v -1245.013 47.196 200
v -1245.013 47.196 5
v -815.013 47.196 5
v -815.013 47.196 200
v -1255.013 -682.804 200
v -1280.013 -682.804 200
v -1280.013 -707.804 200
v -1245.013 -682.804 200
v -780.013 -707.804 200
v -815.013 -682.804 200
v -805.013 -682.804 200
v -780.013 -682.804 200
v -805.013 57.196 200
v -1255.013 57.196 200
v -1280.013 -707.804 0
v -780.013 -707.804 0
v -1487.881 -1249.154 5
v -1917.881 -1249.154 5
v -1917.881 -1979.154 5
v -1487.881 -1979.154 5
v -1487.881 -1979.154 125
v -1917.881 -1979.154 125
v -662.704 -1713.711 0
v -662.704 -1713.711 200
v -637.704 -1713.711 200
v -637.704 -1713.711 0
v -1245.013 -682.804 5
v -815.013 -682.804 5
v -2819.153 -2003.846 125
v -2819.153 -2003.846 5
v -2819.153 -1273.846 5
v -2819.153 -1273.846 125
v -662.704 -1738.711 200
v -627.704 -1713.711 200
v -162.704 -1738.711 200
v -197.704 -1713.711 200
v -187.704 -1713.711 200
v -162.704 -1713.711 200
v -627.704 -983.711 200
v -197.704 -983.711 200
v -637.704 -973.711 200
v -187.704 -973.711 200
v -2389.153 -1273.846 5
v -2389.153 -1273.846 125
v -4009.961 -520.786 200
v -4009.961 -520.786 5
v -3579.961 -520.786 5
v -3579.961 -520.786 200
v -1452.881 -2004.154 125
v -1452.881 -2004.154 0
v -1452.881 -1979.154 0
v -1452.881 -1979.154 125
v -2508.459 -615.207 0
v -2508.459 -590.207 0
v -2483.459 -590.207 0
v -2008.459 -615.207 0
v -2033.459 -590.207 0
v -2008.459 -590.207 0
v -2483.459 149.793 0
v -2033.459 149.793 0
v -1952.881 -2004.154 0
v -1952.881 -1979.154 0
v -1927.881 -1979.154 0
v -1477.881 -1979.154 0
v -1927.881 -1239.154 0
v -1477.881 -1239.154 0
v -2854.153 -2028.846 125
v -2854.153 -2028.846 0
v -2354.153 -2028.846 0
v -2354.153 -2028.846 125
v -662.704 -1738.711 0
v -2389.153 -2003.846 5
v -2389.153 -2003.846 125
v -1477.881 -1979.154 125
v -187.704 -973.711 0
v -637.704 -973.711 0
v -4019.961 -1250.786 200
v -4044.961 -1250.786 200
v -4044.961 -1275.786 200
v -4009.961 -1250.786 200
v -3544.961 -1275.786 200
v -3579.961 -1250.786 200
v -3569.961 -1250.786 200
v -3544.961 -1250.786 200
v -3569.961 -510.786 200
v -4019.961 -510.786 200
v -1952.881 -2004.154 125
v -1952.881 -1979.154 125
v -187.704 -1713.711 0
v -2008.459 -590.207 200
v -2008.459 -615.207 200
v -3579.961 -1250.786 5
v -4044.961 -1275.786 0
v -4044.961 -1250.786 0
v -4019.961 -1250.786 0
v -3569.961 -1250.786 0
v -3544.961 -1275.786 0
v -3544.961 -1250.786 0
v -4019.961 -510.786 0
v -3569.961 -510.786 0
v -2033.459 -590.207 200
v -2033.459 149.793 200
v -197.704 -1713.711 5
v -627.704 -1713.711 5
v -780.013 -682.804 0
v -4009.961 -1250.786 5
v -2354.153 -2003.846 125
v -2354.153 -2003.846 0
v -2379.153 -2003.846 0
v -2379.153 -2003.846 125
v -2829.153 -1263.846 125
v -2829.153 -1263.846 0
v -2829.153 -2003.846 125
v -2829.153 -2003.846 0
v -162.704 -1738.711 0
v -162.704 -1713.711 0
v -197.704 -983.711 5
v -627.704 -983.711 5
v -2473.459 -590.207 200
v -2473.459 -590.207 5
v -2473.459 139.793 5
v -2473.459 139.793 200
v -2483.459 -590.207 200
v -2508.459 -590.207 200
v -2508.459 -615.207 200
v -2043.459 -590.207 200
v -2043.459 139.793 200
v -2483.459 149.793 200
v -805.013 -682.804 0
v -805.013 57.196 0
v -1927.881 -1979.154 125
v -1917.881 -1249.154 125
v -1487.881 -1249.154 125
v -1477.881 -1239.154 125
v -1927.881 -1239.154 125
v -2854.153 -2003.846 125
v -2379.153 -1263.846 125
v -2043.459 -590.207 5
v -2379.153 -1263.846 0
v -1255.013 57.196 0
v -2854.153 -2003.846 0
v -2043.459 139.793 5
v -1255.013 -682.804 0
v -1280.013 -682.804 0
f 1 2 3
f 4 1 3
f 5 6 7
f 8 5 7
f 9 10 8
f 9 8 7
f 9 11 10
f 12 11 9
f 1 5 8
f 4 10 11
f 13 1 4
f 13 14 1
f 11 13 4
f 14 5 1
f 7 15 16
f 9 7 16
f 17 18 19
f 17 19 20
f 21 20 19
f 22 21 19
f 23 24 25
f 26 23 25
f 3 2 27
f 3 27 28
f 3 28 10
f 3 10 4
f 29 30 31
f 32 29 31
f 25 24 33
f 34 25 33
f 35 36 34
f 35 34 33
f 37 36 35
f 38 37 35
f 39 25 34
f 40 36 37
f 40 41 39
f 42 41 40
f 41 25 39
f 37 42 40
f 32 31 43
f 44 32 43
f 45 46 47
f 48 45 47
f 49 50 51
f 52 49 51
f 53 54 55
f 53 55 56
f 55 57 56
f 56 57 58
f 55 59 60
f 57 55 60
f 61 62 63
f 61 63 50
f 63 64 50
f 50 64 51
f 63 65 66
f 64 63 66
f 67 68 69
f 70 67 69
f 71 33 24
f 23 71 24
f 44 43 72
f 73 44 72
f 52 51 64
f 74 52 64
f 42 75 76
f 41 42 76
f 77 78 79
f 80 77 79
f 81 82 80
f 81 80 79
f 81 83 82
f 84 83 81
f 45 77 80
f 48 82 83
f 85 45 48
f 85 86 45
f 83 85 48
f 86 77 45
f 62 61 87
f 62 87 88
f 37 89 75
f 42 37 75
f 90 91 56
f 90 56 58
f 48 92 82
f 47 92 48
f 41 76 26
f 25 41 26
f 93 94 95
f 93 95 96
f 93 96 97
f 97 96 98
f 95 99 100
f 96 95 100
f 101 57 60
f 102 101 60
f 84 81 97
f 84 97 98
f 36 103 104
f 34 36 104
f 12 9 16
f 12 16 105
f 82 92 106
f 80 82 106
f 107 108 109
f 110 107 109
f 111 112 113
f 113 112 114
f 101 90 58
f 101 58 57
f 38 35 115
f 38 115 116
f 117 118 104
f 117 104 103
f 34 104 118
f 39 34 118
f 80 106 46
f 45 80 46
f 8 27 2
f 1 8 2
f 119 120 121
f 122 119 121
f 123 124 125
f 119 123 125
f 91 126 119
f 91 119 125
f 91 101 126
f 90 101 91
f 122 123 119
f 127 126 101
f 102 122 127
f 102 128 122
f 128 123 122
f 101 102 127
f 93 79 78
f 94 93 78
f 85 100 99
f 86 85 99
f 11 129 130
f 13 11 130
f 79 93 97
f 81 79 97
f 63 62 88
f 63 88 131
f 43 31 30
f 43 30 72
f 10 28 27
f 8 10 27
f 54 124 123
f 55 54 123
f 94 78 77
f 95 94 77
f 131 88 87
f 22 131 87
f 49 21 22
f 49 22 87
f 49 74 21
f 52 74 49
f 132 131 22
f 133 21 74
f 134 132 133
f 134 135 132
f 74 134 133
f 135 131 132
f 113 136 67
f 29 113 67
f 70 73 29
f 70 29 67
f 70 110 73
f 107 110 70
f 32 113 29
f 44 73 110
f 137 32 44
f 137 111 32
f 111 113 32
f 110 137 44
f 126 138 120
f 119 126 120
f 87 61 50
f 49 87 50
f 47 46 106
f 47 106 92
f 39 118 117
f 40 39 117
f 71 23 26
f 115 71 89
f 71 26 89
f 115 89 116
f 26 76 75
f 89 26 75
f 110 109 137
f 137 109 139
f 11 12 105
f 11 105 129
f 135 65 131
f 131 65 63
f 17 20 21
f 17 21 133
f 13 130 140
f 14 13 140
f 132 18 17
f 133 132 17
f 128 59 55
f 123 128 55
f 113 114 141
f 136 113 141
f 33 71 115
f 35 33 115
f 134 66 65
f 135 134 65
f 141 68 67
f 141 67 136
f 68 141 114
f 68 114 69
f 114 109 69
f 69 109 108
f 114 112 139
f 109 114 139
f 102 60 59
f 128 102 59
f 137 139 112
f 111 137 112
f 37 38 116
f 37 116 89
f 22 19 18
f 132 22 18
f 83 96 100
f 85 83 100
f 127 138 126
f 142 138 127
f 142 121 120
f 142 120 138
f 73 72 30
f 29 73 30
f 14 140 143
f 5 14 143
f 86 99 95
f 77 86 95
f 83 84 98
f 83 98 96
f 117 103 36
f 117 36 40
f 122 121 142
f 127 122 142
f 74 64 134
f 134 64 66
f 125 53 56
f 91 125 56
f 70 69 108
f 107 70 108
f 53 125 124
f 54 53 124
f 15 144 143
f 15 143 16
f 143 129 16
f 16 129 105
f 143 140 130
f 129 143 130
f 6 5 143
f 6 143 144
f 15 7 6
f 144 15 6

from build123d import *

# Parameters (mm, degrees)
F0_W     = 430
F0_H     = 10
F0_W_2   = 10
F0_H_2   = 730
F0_W_3   = 25
F0_H_3   = 25
F1_DEPTH = 200
F2_DEPTH = 125
F3_DEPTH = 5


with BuildPart() as f1:
    # F0 (on Top) → F1 (new body)
    with BuildSketch(Plane.XY):
        Polygon((-4019.9609445532, -520.78614374), (-4019.9609445532, -780.78614374), (-4019.9609445532, -1080.78614374), (-4019.9609445532, -1250.78614374), (-4009.9609445532, -1250.78614374), (-4009.9609445532, -520.78614374), align=None)
        with Locations((-3794.9609445532, -515.78614374)):
            Rectangle(F0_W, F0_H)
        with Locations((-4014.9609445532, -515.78614374)):
            Rectangle(F0_W_2, F0_H)
        with Locations((-3574.9609445532, -515.78614374)):
            Rectangle(F0_W_2, F0_H)
        with Locations((-3574.9609445532, -885.78614374)):
            Rectangle(F0_W_2, F0_H_2)
        Polygon((-3569.9609445532, -1271.3719205062), (-3569.9609445532, -1275.78614374), (-3544.9609445532, -1275.78614374), (-3544.9609445532, -1250.78614374), (-3569.9609445532, -1250.78614374), align=None)
        Polygon((-4009.9609445532, -1250.78614374), (-4019.9609445532, -1250.78614374), (-4019.9609445532, -1275.78614374), (-3569.9609445532, -1275.78614374), (-3569.9609445532, -1271.3719205062), (-3569.9609445532, -1250.78614374), (-3579.9609445532, -1250.78614374), align=None)
        with Locations((-4032.4609445532, -1263.28614374)):
            Rectangle(F0_W_3, F0_H_3)
    extrude(amount=F1_DEPTH)

    # F0 (on Top) → F3, piece 6 (join)
    with BuildSketch(Plane.XY):
        with Locations((-3794.9609445532, -885.78614374)):
            Rectangle(F0_W, F0_H_2)
    extrude(amount=F3_DEPTH)


with BuildPart() as f1b:
    # F0 (on Top) → F1, piece 2 (new body)
    with BuildSketch(Plane.XY):
        Polygon((-2483.459186554, 139.7927517568), (-2483.459186554, -120.2072482432), (-2483.459186554, -420.2072482432), (-2483.459186554, -590.2072482432), (-2473.459186554, -590.2072482432), (-2473.459186554, 139.7927517568), align=None)
        with Locations((-2478.459186554, 144.7927517568)):
            Rectangle(F0_W_2, F0_H)
        with Locations((-2258.459186554, 144.7927517568)):
            Rectangle(F0_W, F0_H)
        with Locations((-2038.459186554, -225.2072482432)):
            Rectangle(F0_W_2, F0_H_2)
        with Locations((-2038.459186554, 144.7927517568)):
            Rectangle(F0_W_2, F0_H)
        Polygon((-2473.459186554, -590.2072482432), (-2483.459186554, -590.2072482432), (-2483.459186554, -615.2072482432), (-2033.459186554, -615.2072482432), (-2033.459186554, -610.7930250093), (-2033.459186554, -590.2072482432), (-2043.459186554, -590.2072482432), align=None)
        Polygon((-2033.459186554, -610.7930250093), (-2033.459186554, -615.2072482432), (-2008.459186554, -615.2072482432), (-2008.459186554, -590.2072482432), (-2033.459186554, -590.2072482432), align=None)
        with Locations((-2495.959186554, -602.7072482432)):
            Rectangle(F0_W_3, F0_H_3)
    extrude(amount=F1_DEPTH)

    # F0 (on Top) → F3, piece 5 (join)
    with BuildSketch(Plane.XY):
        with Locations((-2258.459186554, -225.2072482432)):
            Rectangle(F0_W, F0_H_2)
    extrude(amount=F3_DEPTH)


with BuildPart() as f1c:
    # F0 (on Top) → F1, piece 3 (new body)
    with BuildSketch(Plane.XY):
        with Locations((-1267.5131797791, -695.3036599482)):
            Rectangle(F0_W_3, F0_H_3)
        Polygon((-1245.0131797791, -682.8036599482), (-1255.0131797791, -682.8036599482), (-1255.0131797791, -707.8036599482), (-805.0131797791, -707.8036599482), (-805.0131797791, -703.3894367144), (-805.0131797791, -682.8036599482), (-815.0131797791, -682.8036599482), align=None)
        Polygon((-805.0131797791, -703.3894367144), (-805.0131797791, -707.8036599482), (-780.0131797791, -707.8036599482), (-780.0131797791, -682.8036599482), (-805.0131797791, -682.8036599482), align=None)
        with Locations((-810.0131797791, -317.8036599482)):
            Rectangle(F0_W_2, F0_H_2)
        Polygon((-1255.0131797791, 47.1963400518), (-1255.0131797791, -212.8036599482), (-1255.0131797791, -512.8036599482), (-1255.0131797791, -682.8036599482), (-1245.0131797791, -682.8036599482), (-1245.0131797791, 47.1963400518), align=None)
        with Locations((-1250.0131797791, 52.1963400518)):
            Rectangle(F0_W_2, F0_H)
        with Locations((-1030.0131797791, 52.1963400518)):
            Rectangle(F0_W, F0_H)
        with Locations((-810.0131797791, 52.1963400518)):
            Rectangle(F0_W_2, F0_H)
    extrude(amount=F1_DEPTH)

    # F0 (on Top) → F3, piece 4 (join)
    with BuildSketch(Plane.XY):
        with Locations((-1030.0131797791, -317.8036599482)):
            Rectangle(F0_W, F0_H_2)
    extrude(amount=F3_DEPTH)


with BuildPart() as f1d:
    # F0 (on Top) → F1, piece 4 (new body)
    with BuildSketch(Plane.XY):
        with Locations((-632.7036094666, -978.7105756129)):
            Rectangle(F0_W_2, F0_H)
        with Locations((-412.7036094666, -978.7105756129)):
            Rectangle(F0_W, F0_H)
        with Locations((-192.7036094666, -978.7105756129)):
            Rectangle(F0_W_2, F0_H)
        with Locations((-192.7036094666, -1348.7105756129)):
            Rectangle(F0_W_2, F0_H_2)
        Polygon((-637.7036094666, -983.7105756129), (-637.7036094666, -1243.7105756129), (-637.7036094666, -1543.7105756129), (-637.7036094666, -1713.7105756129), (-627.7036094666, -1713.7105756129), (-627.7036094666, -983.7105756129), align=None)
        with Locations((-650.2036094666, -1726.2105756129)):
            Rectangle(F0_W_3, F0_H_3)
        Polygon((-627.7036094666, -1713.7105756129), (-637.7036094666, -1713.7105756129), (-637.7036094666, -1738.7105756129), (-187.7036094666, -1738.7105756129), (-187.7036094666, -1734.296352379), (-187.7036094666, -1713.7105756129), (-197.7036094666, -1713.7105756129), align=None)
        Polygon((-187.7036094666, -1734.296352379), (-187.7036094666, -1738.7105756129), (-162.7036094666, -1738.7105756129), (-162.7036094666, -1713.7105756129), (-187.7036094666, -1713.7105756129), align=None)
    extrude(amount=F1_DEPTH)

    # F0 (on Top) → F3, piece 3 (join)
    with BuildSketch(Plane.XY):
        with Locations((-412.7036094666, -1348.7105756129)):
            Rectangle(F0_W, F0_H_2)
    extrude(amount=F3_DEPTH)


with BuildPart() as f2:
    # F0 (on Top) → F2 (new body)
    with BuildSketch(Plane.XY):
        with Locations((-2841.6525363922, -2016.3460784281)):
            Rectangle(F0_W_3, F0_H_3)
        Polygon((-2819.1525363922, -2003.8460784281), (-2829.1525363922, -2003.8460784281), (-2829.1525363922, -2028.8460784281), (-2379.1525363922, -2028.8460784281), (-2379.1525363922, -2024.4318551943), (-2379.1525363922, -2003.8460784281), (-2389.1525363922, -2003.8460784281), align=None)
        Polygon((-2379.1525363922, -2024.4318551943), (-2379.1525363922, -2028.8460784281), (-2354.1525363922, -2028.8460784281), (-2354.1525363922, -2003.8460784281), (-2379.1525363922, -2003.8460784281), align=None)
        with Locations((-2384.1525363922, -1638.8460784281)):
            Rectangle(F0_W_2, F0_H_2)
        with Locations((-2384.1525363922, -1268.8460784281)):
            Rectangle(F0_W_2, F0_H)
        with Locations((-2604.1525363922, -1268.8460784281)):
            Rectangle(F0_W, F0_H)
        Polygon((-2829.1525363922, -1273.8460784281), (-2829.1525363922, -1533.8460784281), (-2829.1525363922, -1833.8460784281), (-2829.1525363922, -2003.8460784281), (-2819.1525363922, -2003.8460784281), (-2819.1525363922, -1273.8460784281), align=None)
        with Locations((-2824.1525363922, -1268.8460784281)):
            Rectangle(F0_W_2, F0_H)
    extrude(amount=F2_DEPTH)

    # F0 (on Top) → F3 (join)
    with BuildSketch(Plane.XY):
        with Locations((-2604.1525363922, -1638.8460784281)):
            Rectangle(F0_W, F0_H_2)
    extrude(amount=F3_DEPTH)


with BuildPart() as f2b:
    # F0 (on Top) → F2, piece 2 (new body)
    with BuildSketch(Plane.XY):
        with Locations((-1702.8805971146, -1244.153662237)):
            Rectangle(F0_W, F0_H)
        with Locations((-1922.8805971146, -1244.153662237)):
            Rectangle(F0_W_2, F0_H)
        Polygon((-1927.8805971146, -1249.153662237), (-1927.8805971146, -1509.153662237), (-1927.8805971146, -1809.153662237), (-1927.8805971146, -1979.153662237), (-1917.8805971146, -1979.153662237), (-1917.8805971146, -1249.153662237), align=None)
        with Locations((-1940.3805971146, -1991.653662237)):
            Rectangle(F0_W_3, F0_H_3)
        Polygon((-1917.8805971146, -1979.153662237), (-1927.8805971146, -1979.153662237), (-1927.8805971146, -2004.153662237), (-1477.8805971146, -2004.153662237), (-1477.8805971146, -1999.7394390032), (-1477.8805971146, -1979.153662237), (-1487.8805971146, -1979.153662237), align=None)
        Polygon((-1477.8805971146, -1999.7394390032), (-1477.8805971146, -2004.153662237), (-1452.8805971146, -2004.153662237), (-1452.8805971146, -1979.153662237), (-1477.8805971146, -1979.153662237), align=None)
        with Locations((-1482.8805971146, -1614.153662237)):
            Rectangle(F0_W_2, F0_H_2)
        with Locations((-1482.8805971146, -1244.153662237)):
            Rectangle(F0_W_2, F0_H)
    extrude(amount=F2_DEPTH)

    # F0 (on Top) → F3, piece 2 (join)
    with BuildSketch(Plane.XY):
        with Locations((-1702.8805971146, -1614.153662237)):
            Rectangle(F0_W, F0_H_2)
    extrude(amount=F3_DEPTH)


solid = Compound([f1.part, f1b.part, f1c.part, f1d.part, f2.part, f2b.part])
